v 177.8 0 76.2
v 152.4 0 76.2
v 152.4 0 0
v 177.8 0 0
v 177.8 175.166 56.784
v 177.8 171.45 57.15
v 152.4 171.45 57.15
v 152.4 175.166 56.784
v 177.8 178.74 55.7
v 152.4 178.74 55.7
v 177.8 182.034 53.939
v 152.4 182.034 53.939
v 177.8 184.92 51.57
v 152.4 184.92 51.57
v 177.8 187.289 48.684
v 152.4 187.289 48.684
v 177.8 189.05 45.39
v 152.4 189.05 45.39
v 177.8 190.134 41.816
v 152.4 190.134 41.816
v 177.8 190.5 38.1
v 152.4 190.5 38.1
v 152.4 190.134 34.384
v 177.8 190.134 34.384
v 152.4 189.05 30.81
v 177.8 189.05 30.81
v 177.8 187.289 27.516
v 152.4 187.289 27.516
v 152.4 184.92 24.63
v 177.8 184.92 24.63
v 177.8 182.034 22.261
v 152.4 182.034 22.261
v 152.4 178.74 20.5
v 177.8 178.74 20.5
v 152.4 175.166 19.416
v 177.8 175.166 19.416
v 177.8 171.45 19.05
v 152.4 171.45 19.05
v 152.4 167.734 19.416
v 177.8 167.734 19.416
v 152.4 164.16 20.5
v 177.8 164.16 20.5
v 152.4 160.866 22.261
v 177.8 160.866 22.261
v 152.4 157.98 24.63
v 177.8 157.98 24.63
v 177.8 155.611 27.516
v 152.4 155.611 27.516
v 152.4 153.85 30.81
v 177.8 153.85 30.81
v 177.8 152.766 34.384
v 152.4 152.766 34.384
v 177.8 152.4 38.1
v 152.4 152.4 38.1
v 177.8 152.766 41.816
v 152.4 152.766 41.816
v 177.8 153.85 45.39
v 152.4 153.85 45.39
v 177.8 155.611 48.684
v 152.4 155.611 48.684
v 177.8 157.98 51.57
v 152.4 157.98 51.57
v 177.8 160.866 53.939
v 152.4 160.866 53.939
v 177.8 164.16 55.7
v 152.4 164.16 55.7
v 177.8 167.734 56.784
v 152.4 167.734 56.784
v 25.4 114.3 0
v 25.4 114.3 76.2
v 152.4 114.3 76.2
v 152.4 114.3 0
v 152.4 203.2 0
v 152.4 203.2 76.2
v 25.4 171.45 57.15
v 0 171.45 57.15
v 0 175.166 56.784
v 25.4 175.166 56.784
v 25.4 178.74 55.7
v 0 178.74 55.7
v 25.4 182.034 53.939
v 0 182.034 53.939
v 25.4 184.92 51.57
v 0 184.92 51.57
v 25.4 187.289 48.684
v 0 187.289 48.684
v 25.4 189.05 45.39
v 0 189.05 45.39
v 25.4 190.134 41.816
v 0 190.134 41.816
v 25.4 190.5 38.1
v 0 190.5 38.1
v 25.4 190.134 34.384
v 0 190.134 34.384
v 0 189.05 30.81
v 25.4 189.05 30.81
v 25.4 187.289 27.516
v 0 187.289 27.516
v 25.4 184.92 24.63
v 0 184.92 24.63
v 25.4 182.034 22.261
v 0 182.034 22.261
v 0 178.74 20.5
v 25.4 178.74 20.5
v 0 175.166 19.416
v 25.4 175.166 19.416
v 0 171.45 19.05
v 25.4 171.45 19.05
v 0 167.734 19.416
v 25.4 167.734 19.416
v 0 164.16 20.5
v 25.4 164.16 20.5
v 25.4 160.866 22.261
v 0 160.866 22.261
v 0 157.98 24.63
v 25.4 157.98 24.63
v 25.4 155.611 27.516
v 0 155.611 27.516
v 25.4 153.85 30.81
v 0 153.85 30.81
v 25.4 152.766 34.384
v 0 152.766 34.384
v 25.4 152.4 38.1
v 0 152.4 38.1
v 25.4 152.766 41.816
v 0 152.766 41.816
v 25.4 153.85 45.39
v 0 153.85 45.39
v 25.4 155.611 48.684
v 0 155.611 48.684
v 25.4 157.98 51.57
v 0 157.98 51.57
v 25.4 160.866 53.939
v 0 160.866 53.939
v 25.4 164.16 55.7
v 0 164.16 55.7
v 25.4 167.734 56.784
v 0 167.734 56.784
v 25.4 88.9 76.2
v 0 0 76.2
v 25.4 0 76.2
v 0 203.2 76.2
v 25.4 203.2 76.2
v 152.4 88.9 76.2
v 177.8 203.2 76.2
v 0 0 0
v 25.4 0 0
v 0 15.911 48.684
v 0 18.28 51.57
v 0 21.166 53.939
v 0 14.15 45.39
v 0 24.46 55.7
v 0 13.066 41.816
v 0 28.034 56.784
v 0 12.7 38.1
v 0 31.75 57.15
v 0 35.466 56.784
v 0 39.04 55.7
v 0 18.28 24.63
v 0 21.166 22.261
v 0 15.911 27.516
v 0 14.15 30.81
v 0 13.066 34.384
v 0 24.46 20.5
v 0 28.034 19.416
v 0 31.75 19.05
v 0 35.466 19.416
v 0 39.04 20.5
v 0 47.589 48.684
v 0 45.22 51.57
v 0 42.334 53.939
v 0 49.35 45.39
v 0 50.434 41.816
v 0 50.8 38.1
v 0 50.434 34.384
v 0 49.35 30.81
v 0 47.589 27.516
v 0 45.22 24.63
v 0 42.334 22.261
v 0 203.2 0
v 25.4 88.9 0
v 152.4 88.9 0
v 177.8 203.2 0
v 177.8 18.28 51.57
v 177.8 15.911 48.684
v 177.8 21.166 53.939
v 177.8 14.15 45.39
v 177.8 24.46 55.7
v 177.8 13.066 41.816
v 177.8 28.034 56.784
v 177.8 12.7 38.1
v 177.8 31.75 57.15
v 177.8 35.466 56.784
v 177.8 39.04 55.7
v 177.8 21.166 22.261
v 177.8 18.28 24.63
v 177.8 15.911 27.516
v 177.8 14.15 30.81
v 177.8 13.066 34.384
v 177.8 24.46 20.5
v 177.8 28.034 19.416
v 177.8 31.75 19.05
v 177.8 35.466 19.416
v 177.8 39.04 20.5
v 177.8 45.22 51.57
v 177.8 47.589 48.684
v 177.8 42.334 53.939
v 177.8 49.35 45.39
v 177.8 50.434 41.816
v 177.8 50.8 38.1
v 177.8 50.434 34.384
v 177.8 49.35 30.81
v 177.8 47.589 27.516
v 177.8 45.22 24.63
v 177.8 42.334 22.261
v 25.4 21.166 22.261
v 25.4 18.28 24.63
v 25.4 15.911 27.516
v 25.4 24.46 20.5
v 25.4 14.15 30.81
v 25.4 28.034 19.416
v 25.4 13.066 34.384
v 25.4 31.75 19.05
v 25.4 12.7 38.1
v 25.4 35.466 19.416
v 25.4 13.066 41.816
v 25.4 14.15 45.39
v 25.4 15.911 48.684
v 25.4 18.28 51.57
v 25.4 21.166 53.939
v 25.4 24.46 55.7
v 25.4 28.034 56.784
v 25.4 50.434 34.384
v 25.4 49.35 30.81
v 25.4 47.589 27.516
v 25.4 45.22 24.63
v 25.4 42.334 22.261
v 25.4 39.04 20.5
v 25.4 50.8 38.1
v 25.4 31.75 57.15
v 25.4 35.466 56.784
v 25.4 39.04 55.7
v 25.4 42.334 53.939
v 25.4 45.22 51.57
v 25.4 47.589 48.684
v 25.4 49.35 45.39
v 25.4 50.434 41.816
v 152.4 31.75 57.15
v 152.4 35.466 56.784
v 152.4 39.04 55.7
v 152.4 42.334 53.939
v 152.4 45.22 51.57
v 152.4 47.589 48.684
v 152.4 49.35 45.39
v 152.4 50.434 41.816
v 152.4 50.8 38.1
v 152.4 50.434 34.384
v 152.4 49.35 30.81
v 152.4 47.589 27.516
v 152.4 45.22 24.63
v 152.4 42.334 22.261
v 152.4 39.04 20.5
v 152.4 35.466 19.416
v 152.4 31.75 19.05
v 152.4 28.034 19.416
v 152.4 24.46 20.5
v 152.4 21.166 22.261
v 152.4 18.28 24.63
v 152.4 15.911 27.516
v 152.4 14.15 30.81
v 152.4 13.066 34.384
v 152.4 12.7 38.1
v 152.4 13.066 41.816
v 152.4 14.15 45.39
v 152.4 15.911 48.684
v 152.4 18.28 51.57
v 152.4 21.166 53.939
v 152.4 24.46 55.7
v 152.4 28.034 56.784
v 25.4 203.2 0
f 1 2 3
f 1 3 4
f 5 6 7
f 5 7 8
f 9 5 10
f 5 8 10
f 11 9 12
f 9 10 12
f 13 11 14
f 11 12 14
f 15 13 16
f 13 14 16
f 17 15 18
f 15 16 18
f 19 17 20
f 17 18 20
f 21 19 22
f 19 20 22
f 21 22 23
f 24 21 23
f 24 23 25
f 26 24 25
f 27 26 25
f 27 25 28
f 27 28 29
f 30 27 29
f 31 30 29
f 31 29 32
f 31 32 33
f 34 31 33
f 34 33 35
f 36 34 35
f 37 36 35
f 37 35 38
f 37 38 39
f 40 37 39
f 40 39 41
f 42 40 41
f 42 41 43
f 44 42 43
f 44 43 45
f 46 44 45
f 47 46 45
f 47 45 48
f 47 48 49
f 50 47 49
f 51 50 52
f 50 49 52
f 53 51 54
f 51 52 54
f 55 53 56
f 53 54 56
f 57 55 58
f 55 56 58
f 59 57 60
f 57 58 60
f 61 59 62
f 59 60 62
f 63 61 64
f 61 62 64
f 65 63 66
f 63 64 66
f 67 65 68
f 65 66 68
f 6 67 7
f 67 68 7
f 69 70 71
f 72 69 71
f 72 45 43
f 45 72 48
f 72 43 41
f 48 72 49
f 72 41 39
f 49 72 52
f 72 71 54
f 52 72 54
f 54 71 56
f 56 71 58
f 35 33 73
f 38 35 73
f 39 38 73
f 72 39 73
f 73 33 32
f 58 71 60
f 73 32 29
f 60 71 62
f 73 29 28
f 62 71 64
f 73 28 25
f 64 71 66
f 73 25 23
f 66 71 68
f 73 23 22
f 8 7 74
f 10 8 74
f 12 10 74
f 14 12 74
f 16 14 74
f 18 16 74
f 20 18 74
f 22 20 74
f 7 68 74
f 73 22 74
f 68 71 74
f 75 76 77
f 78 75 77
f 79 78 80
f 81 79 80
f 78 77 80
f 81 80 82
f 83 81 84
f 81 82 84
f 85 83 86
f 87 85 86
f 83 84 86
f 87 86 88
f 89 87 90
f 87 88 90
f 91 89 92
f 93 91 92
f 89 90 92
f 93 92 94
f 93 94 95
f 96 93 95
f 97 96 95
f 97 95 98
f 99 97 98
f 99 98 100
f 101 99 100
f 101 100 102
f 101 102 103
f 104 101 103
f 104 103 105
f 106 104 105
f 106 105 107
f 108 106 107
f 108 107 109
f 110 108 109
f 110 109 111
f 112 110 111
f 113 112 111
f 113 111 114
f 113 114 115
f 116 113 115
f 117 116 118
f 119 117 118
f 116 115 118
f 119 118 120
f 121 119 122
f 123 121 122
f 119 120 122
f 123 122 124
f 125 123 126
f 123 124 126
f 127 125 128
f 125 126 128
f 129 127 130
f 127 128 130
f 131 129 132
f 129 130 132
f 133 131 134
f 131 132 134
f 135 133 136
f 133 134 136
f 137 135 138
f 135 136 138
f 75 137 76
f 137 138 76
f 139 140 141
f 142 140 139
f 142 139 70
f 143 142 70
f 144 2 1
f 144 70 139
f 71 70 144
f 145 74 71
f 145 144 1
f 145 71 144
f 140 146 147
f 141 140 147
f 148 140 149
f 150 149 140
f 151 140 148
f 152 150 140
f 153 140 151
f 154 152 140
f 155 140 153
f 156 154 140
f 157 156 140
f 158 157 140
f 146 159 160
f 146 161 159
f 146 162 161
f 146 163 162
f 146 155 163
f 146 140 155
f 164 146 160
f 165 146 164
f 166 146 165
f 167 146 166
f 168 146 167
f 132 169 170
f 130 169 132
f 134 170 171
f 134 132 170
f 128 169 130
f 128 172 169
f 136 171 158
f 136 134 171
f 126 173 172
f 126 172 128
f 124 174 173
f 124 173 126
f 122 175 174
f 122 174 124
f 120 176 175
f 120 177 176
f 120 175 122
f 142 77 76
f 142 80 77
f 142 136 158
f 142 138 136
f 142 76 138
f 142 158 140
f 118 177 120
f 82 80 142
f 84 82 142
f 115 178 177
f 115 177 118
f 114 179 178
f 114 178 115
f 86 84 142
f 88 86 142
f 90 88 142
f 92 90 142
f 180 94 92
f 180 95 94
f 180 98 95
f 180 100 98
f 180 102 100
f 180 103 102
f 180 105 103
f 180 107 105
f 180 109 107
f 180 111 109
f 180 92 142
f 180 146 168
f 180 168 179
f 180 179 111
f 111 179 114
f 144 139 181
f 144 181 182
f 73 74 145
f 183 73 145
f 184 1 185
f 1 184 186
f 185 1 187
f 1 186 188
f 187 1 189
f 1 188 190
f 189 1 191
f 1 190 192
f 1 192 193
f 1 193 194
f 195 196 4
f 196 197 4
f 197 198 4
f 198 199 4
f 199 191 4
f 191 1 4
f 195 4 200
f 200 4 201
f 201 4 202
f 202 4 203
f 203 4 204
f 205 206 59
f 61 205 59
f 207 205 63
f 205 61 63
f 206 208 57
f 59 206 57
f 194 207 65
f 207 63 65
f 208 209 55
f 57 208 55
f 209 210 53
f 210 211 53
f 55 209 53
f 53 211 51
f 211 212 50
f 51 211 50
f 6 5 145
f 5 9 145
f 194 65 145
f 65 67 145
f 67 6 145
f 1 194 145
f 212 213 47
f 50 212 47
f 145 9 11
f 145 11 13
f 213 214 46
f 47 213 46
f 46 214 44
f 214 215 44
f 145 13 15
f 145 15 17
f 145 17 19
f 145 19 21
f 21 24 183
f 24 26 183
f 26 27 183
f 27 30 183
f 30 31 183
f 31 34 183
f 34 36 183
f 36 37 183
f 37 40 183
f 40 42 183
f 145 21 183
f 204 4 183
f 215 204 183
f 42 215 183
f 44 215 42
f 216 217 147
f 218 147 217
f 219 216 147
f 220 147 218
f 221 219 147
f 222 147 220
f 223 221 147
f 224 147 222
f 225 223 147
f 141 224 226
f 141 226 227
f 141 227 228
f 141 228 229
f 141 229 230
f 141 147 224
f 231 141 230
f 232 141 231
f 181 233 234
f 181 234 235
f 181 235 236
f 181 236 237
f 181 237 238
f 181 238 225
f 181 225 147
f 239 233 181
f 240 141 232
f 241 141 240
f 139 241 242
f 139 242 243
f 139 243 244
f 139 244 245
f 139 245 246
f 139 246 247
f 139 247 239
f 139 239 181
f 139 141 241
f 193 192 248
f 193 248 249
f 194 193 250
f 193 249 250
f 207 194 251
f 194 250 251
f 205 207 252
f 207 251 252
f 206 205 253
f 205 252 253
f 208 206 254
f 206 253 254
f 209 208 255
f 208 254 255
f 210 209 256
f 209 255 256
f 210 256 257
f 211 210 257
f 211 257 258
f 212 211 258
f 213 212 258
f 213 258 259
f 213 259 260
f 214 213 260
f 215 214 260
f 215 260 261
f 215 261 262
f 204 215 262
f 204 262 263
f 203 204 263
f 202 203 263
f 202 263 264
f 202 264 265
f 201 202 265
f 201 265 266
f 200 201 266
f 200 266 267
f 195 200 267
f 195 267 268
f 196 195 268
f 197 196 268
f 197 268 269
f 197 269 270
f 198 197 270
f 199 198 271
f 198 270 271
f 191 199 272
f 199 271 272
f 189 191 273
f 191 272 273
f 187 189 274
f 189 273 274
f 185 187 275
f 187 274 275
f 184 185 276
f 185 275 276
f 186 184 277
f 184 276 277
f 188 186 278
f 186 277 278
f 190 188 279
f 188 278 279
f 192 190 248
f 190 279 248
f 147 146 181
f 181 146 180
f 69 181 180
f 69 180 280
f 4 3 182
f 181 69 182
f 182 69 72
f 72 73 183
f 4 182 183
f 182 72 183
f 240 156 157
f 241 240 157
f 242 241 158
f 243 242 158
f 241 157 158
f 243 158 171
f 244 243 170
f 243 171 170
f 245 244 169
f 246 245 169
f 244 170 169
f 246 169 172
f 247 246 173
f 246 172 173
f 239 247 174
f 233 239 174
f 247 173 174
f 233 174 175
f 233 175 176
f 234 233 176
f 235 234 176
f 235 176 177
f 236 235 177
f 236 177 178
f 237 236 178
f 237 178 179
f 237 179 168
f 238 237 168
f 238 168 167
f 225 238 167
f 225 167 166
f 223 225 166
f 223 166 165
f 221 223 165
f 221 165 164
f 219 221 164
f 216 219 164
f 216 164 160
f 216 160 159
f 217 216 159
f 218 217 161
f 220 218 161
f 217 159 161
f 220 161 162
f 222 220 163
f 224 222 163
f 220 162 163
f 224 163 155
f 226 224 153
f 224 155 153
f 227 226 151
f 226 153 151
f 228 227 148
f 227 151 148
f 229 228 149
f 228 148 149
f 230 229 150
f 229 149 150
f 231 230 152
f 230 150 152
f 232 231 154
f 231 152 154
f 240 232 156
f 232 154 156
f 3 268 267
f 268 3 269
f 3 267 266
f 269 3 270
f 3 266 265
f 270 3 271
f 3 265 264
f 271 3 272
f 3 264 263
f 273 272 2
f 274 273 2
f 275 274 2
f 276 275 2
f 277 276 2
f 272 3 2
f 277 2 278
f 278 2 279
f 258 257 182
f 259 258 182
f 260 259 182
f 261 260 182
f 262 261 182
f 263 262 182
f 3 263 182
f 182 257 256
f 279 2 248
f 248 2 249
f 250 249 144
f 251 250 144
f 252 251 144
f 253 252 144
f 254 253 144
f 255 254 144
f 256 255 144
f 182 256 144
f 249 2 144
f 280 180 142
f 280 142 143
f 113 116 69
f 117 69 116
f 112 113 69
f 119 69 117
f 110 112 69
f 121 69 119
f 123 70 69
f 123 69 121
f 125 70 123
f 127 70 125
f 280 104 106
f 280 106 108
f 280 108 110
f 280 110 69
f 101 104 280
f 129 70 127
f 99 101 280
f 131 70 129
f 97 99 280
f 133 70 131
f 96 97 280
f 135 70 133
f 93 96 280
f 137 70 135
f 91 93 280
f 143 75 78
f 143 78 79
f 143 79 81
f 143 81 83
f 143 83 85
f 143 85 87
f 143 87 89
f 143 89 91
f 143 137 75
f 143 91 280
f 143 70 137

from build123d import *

# Parameters (mm, degrees)
SKETCH1_W           = 177.8
SKETCH1_H           = 203.2
BOSS_EXTRUDE2_DEPTH = 76.2
SKETCH3_W           = 127
SKETCH3_H           = 88.9
CUT_EXTRUDE1_DEPTH  = 76.2
SKETCH4_R           = 19.05
CUT_EXTRUDE3_DEPTH  = 199.898


with BuildPart() as part:
    # Sketch1 → Boss-Extrude2 (new body)
    with BuildSketch(Plane.XY):
        with Locations((88.9, 101.6)):
            Rectangle(SKETCH1_W, SKETCH1_H)
    extrude(amount=BOSS_EXTRUDE2_DEPTH)

    # Sketch3 → Cut-Extrude1 (cut)
    with BuildSketch(Plane.XY.offset(76.2)):
        with Locations((88.9, 158.75)):
            Rectangle(SKETCH3_W, SKETCH3_H)
        with Locations((88.9, 44.45)):
            Rectangle(SKETCH3_W, SKETCH3_H)
    extrude(amount=-CUT_EXTRUDE1_DEPTH, mode=Mode.SUBTRACT)

    # Sketch4 → Cut-Extrude3 (cut)
    with BuildSketch(Plane.ZY):
        with Locations((38.1, 171.45)):
            Circle(SKETCH4_R)
        with Locations((38.1, 31.75)):
            Circle(SKETCH4_R)
    extrude(amount=-CUT_EXTRUDE3_DEPTH, mode=Mode.SUBTRACT)


solid = part.part
